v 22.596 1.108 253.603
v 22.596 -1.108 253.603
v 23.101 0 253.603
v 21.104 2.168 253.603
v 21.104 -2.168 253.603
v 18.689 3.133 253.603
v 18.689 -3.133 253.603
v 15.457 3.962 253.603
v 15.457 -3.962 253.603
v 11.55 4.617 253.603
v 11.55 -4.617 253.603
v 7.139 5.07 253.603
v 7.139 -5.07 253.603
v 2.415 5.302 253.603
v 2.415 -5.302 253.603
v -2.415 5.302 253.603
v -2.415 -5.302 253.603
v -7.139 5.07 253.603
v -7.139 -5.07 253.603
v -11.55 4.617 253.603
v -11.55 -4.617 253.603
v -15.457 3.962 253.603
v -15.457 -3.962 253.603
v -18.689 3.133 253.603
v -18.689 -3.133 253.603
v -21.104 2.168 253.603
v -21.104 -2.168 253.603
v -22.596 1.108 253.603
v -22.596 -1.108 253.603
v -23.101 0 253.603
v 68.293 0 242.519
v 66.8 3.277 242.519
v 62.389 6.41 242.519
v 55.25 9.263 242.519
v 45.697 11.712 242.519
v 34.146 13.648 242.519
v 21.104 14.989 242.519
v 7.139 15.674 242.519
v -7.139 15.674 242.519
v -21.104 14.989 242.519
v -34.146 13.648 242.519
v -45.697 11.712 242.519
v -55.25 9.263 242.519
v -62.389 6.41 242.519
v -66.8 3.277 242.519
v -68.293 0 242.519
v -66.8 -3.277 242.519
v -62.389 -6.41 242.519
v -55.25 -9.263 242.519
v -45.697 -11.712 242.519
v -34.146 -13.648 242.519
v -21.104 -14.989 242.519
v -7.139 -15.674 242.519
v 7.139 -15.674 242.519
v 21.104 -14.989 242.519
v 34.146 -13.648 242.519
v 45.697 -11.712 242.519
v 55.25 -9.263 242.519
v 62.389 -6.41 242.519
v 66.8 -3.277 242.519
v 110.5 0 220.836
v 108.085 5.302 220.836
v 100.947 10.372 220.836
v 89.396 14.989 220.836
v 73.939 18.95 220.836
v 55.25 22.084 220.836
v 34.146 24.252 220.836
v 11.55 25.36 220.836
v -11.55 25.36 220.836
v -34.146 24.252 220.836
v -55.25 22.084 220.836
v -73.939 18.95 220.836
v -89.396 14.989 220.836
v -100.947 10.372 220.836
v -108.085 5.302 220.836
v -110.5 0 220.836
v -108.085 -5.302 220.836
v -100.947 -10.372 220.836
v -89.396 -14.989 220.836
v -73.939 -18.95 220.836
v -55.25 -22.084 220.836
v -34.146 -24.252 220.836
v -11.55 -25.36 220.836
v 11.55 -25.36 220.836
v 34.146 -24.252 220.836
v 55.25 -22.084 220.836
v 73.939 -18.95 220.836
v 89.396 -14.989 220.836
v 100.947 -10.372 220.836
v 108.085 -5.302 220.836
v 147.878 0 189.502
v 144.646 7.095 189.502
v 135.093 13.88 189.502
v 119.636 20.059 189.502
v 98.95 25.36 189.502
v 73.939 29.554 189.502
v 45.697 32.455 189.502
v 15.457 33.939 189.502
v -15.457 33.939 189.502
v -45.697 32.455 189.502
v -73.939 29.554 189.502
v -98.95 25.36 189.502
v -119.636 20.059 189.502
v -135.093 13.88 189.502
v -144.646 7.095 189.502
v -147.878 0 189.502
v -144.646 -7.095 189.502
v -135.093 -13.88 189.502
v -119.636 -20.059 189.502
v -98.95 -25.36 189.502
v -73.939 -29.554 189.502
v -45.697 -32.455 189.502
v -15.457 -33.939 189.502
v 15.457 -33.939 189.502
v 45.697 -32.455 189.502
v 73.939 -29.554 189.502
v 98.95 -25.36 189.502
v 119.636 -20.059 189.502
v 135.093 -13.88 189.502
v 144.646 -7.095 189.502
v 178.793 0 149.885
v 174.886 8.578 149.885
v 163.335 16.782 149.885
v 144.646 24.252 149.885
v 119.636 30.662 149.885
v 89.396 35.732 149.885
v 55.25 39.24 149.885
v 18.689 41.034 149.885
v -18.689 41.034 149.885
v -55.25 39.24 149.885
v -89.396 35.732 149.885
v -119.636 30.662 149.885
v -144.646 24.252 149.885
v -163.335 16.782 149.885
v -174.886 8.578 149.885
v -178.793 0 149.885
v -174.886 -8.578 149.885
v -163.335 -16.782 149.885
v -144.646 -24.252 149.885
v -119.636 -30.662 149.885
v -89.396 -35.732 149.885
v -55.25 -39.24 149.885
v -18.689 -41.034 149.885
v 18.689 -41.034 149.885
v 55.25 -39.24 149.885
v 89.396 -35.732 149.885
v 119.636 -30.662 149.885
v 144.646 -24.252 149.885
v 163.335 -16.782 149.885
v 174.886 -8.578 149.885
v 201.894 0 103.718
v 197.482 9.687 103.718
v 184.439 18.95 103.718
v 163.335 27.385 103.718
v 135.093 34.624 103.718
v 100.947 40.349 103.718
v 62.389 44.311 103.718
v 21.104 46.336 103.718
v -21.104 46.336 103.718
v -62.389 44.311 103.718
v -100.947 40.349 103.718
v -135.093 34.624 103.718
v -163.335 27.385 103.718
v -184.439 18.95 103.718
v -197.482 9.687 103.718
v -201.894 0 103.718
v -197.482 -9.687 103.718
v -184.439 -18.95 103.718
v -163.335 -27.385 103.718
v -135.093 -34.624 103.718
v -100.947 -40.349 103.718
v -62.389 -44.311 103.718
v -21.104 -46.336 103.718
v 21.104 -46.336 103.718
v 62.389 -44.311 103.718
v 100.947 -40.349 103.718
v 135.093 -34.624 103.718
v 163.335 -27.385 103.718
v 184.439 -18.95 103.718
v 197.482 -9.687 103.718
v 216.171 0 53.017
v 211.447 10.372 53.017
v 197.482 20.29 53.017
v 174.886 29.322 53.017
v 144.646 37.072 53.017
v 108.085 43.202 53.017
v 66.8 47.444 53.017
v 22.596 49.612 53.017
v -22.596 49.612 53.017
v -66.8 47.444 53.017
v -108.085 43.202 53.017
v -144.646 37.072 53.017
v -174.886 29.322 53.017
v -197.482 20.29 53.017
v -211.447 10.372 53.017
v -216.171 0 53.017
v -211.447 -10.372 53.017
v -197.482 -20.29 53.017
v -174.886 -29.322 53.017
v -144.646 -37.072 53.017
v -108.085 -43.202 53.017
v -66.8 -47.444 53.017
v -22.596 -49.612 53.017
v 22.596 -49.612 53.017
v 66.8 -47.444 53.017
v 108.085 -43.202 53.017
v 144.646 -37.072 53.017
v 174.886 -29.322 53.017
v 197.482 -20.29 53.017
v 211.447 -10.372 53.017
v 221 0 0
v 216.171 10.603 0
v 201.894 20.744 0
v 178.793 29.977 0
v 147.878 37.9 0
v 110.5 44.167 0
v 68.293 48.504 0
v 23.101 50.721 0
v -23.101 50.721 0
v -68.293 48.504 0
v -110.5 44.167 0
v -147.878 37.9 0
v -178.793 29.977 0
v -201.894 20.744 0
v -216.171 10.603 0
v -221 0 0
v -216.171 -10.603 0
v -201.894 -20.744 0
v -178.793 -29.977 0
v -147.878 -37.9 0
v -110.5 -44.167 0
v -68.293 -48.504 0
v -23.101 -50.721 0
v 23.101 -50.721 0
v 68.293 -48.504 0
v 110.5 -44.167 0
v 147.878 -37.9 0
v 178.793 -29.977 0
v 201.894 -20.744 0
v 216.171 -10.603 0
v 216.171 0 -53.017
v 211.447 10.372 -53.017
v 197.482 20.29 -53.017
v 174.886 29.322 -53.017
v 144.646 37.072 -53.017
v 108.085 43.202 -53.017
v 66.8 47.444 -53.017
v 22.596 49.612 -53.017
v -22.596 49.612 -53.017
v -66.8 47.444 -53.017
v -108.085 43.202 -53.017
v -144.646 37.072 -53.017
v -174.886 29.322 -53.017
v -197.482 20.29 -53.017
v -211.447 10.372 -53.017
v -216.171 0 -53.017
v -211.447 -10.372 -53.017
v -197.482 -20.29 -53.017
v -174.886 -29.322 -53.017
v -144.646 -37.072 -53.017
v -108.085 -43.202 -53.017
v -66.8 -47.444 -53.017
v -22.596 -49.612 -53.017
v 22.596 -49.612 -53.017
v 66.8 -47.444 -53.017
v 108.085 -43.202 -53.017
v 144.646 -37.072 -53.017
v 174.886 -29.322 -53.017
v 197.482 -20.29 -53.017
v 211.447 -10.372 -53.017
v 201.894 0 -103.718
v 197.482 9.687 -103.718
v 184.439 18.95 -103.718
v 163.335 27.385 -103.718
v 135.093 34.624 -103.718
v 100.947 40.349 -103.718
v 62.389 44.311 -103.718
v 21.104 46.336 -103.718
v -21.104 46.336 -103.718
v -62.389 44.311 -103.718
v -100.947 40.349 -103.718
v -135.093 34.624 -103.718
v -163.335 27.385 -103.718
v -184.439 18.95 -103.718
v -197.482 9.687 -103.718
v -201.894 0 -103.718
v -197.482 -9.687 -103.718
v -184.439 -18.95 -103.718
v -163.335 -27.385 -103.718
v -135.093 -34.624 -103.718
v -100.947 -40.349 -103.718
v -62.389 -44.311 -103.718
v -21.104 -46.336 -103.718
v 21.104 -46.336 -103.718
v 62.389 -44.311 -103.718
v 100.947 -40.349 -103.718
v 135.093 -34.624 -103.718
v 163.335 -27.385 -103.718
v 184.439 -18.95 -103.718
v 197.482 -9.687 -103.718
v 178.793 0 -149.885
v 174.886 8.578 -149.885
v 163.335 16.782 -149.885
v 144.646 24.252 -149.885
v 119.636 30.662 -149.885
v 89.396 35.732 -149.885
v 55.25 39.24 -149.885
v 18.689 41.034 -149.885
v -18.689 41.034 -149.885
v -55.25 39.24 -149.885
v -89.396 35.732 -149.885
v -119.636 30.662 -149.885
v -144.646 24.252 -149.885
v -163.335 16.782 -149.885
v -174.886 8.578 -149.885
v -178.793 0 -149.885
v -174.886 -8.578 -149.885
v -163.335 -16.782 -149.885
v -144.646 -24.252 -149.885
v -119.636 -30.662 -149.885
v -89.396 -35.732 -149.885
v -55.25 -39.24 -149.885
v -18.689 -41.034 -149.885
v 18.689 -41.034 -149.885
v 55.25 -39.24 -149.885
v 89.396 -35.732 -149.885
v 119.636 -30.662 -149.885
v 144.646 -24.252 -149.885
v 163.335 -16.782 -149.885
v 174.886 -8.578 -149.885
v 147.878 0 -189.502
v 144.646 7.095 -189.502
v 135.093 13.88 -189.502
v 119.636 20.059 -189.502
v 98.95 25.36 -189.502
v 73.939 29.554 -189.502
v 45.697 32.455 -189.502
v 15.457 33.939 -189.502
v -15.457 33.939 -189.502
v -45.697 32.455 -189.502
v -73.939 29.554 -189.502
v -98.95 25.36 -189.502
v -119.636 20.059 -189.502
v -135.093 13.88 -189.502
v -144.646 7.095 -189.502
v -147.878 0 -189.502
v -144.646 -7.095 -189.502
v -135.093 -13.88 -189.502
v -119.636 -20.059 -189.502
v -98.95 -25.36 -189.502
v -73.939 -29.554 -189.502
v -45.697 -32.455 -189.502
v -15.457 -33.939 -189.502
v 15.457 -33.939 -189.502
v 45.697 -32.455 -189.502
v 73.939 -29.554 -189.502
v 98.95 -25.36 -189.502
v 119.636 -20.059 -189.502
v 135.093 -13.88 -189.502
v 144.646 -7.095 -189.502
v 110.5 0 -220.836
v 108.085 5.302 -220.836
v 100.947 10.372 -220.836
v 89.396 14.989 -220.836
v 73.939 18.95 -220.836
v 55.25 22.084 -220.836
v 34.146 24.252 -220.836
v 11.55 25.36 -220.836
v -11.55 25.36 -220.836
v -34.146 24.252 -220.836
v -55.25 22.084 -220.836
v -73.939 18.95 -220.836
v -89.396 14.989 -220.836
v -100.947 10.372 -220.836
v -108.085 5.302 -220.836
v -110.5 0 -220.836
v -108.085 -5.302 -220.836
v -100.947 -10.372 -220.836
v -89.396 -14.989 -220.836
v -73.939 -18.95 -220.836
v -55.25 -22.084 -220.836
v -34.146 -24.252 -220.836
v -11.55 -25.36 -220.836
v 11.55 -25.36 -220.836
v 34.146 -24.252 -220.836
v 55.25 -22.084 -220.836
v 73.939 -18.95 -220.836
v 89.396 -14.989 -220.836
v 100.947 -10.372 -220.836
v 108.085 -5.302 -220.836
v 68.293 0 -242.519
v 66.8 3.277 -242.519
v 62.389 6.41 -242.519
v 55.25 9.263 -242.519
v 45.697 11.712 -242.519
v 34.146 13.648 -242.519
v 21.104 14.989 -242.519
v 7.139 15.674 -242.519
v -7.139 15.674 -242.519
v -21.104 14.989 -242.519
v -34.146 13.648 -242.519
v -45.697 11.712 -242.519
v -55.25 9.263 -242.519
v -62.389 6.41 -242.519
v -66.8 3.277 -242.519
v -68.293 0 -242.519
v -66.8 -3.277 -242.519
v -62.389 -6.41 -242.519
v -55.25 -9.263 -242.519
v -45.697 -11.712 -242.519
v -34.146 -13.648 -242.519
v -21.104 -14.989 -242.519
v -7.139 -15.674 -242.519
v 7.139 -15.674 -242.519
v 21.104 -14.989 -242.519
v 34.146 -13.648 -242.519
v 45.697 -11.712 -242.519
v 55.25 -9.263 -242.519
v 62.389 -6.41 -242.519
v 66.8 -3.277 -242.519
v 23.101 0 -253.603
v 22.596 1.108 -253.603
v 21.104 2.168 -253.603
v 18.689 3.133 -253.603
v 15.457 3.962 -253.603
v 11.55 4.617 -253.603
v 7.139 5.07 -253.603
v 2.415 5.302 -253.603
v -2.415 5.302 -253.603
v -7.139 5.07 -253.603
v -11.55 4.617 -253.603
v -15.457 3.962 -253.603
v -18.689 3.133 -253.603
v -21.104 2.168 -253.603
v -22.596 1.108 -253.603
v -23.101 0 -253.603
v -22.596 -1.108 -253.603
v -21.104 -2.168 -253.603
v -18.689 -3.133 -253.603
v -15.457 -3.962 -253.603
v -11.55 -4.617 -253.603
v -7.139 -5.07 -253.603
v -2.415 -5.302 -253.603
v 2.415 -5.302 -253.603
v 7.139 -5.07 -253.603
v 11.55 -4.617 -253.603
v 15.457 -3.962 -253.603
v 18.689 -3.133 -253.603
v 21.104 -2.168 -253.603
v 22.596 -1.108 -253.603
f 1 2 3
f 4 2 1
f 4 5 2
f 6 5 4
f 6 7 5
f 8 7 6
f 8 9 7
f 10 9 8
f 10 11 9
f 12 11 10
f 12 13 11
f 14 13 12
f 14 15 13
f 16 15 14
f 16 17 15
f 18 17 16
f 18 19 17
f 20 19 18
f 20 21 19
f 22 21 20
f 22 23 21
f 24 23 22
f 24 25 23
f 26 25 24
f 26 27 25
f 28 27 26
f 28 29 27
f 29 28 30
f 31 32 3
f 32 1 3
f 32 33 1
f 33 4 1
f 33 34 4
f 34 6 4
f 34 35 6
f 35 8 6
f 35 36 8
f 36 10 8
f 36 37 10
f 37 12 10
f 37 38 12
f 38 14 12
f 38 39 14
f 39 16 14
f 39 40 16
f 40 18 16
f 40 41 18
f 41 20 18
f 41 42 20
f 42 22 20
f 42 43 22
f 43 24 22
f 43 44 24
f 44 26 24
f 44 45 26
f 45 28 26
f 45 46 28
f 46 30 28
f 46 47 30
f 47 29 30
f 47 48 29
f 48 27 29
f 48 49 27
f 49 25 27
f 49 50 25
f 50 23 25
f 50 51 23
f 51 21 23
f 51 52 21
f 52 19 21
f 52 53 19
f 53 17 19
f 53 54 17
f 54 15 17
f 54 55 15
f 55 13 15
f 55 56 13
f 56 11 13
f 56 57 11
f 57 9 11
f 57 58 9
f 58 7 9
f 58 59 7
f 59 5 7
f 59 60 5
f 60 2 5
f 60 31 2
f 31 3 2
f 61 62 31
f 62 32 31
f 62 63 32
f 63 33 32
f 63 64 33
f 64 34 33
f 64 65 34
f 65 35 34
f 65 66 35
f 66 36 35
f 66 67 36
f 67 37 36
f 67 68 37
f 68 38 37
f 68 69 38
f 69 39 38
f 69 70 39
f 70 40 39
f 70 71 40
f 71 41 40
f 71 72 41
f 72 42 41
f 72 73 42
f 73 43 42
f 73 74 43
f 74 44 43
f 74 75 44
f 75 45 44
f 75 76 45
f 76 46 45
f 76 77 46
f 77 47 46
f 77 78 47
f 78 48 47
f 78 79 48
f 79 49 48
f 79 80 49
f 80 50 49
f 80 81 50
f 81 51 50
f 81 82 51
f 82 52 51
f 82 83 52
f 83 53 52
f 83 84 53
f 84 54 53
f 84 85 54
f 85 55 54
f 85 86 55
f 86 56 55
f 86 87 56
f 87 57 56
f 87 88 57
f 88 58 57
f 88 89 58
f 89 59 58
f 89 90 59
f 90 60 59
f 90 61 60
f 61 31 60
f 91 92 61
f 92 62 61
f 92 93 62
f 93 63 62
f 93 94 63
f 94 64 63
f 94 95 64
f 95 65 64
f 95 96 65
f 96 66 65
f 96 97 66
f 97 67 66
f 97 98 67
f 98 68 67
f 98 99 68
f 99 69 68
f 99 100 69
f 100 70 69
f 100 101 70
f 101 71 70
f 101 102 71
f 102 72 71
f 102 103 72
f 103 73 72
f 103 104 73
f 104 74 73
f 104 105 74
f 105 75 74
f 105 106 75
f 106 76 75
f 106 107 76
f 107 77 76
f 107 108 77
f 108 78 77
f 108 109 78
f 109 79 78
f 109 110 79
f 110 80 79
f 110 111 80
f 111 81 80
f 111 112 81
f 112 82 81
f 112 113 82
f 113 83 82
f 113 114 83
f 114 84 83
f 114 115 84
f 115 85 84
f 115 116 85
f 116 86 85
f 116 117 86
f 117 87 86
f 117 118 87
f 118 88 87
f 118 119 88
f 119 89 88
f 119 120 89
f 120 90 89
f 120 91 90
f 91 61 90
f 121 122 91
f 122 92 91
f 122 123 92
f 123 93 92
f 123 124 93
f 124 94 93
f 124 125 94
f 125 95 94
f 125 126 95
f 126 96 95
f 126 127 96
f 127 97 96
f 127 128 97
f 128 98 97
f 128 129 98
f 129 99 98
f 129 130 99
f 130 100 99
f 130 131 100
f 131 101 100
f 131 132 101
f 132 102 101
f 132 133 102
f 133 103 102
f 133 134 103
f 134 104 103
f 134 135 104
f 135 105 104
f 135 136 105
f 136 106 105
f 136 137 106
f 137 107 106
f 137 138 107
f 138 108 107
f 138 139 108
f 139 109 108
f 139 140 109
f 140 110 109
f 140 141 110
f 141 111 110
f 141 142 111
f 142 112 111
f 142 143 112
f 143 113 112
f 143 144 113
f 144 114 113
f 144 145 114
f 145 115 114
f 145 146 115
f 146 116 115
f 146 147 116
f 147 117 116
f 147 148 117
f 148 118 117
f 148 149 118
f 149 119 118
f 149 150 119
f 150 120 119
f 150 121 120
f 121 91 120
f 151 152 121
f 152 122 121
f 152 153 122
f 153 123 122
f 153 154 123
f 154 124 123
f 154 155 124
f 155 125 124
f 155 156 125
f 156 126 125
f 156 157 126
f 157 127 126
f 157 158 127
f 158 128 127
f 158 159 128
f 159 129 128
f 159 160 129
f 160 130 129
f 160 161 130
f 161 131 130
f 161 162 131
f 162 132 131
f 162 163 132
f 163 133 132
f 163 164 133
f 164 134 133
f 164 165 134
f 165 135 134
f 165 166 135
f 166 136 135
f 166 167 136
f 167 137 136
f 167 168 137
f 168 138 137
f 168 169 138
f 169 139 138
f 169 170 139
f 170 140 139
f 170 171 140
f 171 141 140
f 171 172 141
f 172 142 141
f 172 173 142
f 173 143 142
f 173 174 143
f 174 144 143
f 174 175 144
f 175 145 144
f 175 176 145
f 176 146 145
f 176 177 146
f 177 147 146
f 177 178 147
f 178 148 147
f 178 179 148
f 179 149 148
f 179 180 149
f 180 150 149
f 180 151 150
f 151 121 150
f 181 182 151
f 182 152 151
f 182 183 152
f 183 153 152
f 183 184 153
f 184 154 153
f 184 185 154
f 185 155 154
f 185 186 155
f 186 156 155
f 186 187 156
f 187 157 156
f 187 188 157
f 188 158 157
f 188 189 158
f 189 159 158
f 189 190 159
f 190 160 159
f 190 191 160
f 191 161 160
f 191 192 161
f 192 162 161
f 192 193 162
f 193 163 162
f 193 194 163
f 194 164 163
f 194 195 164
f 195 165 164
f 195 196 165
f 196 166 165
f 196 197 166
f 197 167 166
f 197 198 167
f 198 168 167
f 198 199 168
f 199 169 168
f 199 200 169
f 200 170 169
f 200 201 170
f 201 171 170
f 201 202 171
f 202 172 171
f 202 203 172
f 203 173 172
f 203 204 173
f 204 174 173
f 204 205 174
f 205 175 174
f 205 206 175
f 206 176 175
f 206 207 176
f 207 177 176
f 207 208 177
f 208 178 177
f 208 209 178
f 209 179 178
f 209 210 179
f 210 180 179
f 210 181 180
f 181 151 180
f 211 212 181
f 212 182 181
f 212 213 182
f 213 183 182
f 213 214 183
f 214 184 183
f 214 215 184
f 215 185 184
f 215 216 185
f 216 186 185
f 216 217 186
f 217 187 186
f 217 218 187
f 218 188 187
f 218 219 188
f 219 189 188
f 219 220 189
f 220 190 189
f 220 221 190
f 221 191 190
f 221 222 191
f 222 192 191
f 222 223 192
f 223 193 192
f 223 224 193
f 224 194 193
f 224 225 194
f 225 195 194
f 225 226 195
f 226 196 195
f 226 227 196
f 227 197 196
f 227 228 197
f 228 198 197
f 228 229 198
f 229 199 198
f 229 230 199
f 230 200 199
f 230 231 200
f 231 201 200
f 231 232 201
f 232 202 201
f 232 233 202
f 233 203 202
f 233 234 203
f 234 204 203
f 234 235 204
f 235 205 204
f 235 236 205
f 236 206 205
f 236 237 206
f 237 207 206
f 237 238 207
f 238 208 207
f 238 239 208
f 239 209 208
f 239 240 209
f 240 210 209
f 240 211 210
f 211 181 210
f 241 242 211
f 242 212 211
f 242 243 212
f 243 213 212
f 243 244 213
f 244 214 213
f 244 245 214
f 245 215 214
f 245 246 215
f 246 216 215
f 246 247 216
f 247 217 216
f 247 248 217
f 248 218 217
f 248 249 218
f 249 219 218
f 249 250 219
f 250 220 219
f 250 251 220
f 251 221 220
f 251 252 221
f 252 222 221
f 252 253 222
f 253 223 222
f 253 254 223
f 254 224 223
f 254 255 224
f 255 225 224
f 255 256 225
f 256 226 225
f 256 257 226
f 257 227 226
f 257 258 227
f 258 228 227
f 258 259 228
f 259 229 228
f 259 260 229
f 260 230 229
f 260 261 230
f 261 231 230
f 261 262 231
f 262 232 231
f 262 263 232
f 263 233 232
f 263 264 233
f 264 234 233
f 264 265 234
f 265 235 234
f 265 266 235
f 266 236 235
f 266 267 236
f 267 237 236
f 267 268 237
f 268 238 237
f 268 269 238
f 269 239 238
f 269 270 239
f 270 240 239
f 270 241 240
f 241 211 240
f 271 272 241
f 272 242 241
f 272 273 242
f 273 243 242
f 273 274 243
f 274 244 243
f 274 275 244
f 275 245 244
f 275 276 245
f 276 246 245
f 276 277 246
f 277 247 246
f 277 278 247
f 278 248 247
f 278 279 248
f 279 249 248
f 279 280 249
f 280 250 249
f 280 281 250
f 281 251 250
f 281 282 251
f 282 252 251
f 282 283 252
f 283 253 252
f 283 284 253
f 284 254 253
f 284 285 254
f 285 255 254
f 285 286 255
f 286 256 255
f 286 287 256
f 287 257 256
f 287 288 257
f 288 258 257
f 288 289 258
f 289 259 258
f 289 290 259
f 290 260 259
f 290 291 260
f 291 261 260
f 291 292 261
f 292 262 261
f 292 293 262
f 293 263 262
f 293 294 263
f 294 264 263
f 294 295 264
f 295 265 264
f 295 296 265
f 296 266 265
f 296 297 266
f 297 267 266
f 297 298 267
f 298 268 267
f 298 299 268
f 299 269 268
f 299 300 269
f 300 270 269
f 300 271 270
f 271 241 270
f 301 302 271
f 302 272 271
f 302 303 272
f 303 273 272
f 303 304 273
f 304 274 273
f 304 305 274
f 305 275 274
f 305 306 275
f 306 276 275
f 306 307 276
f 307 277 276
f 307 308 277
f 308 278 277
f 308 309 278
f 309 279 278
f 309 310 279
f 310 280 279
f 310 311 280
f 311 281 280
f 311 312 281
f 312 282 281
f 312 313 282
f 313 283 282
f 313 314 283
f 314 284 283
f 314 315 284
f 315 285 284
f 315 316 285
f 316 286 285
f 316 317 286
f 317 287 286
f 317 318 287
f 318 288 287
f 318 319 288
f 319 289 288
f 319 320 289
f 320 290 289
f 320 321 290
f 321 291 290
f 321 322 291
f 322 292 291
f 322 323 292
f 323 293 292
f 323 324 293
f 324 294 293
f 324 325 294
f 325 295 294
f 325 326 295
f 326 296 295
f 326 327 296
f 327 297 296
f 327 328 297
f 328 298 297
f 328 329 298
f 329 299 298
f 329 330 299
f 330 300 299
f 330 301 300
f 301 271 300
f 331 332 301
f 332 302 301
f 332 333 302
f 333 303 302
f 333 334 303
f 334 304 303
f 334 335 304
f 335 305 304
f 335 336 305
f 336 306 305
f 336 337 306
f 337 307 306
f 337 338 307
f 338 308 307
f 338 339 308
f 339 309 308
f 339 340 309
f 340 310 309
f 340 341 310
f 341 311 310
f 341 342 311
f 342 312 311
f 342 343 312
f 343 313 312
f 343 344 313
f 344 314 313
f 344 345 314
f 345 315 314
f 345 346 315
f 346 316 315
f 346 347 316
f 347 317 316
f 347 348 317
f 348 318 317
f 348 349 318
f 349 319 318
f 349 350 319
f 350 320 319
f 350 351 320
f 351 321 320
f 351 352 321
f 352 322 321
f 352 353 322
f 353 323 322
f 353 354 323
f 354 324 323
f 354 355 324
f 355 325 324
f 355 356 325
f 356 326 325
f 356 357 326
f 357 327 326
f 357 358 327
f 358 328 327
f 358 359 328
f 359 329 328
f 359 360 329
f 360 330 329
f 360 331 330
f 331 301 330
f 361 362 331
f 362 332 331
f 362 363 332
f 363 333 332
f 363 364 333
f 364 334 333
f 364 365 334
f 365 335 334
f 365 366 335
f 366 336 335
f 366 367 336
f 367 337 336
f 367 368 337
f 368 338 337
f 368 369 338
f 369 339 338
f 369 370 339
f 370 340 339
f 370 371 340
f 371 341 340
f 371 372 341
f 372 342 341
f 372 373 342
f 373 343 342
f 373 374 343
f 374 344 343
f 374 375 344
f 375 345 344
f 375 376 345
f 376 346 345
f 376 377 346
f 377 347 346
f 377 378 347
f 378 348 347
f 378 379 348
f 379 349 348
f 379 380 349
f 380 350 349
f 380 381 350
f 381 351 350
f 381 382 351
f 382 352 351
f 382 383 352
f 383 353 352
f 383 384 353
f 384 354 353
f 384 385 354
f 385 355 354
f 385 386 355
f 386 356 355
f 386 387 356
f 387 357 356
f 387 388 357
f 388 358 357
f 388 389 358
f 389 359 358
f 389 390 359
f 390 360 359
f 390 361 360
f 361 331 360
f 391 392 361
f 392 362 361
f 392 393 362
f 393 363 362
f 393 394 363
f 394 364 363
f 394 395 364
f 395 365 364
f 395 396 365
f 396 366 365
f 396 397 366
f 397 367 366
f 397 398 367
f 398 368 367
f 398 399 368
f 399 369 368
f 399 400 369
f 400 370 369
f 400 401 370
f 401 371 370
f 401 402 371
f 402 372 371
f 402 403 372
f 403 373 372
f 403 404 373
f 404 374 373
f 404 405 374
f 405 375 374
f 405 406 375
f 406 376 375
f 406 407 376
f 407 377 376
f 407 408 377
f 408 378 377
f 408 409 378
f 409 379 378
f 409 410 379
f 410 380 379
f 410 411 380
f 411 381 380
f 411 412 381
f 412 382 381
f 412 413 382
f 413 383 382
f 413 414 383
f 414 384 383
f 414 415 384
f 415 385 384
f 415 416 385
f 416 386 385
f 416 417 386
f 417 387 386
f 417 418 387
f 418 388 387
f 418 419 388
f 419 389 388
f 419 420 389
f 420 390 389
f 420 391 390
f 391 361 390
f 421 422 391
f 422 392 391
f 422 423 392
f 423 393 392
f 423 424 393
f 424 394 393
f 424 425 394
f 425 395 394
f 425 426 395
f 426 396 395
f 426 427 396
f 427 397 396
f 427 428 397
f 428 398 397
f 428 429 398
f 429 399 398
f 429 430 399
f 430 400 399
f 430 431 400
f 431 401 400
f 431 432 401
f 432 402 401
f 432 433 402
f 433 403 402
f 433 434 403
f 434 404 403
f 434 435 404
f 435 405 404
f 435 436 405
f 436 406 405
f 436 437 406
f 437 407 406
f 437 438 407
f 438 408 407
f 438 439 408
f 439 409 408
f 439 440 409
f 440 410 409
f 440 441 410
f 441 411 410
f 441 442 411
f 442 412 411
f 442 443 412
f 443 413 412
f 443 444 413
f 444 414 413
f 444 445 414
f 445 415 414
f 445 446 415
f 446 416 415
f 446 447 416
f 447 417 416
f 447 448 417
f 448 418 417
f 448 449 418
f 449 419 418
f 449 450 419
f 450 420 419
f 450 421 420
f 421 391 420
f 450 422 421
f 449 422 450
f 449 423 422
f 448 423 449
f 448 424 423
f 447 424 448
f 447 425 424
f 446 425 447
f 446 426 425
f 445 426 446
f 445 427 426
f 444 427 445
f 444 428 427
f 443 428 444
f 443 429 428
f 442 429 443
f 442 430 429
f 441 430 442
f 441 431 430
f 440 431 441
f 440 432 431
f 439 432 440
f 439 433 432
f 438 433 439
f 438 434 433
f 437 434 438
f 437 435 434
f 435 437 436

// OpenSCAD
// Generated by SolidPython 1.0.1 on 2020-07-29 00:46:50


scale(v = [13, 3, 15]) {
	sphere(r = 17);
}
/***********************************************
*********      SolidPython code:      **********
************************************************
 
# import packages: SolidPython
from solid import *
from solid.utils import *
from itertools import chain, combinations, permutations


class Resize:

    def __init__(self, scad_file):
        self.scad_file = scad_file
        #self.scad_file = import_scad(scad_file)
        # cone/cylinder param:
        self.r1 = 0
        self.r2 = 0
        self.h = 0
        # rectangular prism param:
        self.w = 0
        self.l = 0
        # ellipse param:
        self.r = 0

    # import OpenScad code (file name corresponds to shape)


    # classify shape + parameters
    def assign(self, param1, param2, param3):
        if self.scad_file == 'cone.scad':
            self.r1 = param1
            self.r2 = param2
            self.h = param3
        elif self.scad_file == 'cylinder.scad':
            self.r1 = param1
            self.r2 = param2
            self.h = param3
        elif self.scad_file == 'rectangularPrism.scad':
            self.h = param1
            self.l = param2
            self.w = param3
        else:
            self.r = param1
            self.h = param2

    # resize parameters
    def iterate(self):
        x = range(3, 20, 2)
        i = 1
        if self.scad_file == 'cone.scad':
            tempList = list(permutations(x, 2))
            for temp in tempList:
                param1 = temp[0]
                param2 = temp[1]
                filepath = 'produced_scad_files/' + 'cone' + str(param1) + '_' + str(param2) + '_' + '.scad'
                scad_render_to_file(cylinder(h=param1, r1=param2, r2=0), filepath)

        elif self.scad_file == 'cylinder.scad':
            tempList = list(permutations(x, 3))
            for temp in tempList:
                param1 = temp[0]
                param2 = temp[1]
                filepath = 'produced_scad_files/' + 'cylinder' + str(param1) + '_' + str(param2) + '_' + '.scad'
                scad_render_to_file(cylinder(h=param1, r1=param2, r2=param2), filepath)

        elif self.scad_file == 'rectangularPrism.scad':
            tempList = list(permutations(x, 3))
            for temp in tempList:
                param1 = temp[0]
                param2 = temp[1]
                param3 = temp[2]
                filepath = 'produced_scad_files/' + 'rectangularPrism' + str(param1) + '_' + str(param2) + '_' + str(
                    param3) + '.scad'
                scad_render_to_file(cube(size=(param1, param2, param3)), filepath)

        elif self.scad_file == 'ellipse.scad':
            tempList = list(permutations(x, 4))
            for temp in tempList:
                param1 = temp[0]
                param2 = temp[1]
                param3 = temp[2]
                param4 = temp[3]
                filepath = 'produced_scad_files/' + 'ellipse' + str(param1) + '_' + str(param2) + '_' + str(param3) + '_' + str(param4) + '.scad'
                scad_render_to_file(scale([param1, param2, param3])(sphere(r=param4)), filepath)

    def render_to_scadfile(self):
        scad_render_to_file(scad, 'example.scad') 
 
************************************************/
